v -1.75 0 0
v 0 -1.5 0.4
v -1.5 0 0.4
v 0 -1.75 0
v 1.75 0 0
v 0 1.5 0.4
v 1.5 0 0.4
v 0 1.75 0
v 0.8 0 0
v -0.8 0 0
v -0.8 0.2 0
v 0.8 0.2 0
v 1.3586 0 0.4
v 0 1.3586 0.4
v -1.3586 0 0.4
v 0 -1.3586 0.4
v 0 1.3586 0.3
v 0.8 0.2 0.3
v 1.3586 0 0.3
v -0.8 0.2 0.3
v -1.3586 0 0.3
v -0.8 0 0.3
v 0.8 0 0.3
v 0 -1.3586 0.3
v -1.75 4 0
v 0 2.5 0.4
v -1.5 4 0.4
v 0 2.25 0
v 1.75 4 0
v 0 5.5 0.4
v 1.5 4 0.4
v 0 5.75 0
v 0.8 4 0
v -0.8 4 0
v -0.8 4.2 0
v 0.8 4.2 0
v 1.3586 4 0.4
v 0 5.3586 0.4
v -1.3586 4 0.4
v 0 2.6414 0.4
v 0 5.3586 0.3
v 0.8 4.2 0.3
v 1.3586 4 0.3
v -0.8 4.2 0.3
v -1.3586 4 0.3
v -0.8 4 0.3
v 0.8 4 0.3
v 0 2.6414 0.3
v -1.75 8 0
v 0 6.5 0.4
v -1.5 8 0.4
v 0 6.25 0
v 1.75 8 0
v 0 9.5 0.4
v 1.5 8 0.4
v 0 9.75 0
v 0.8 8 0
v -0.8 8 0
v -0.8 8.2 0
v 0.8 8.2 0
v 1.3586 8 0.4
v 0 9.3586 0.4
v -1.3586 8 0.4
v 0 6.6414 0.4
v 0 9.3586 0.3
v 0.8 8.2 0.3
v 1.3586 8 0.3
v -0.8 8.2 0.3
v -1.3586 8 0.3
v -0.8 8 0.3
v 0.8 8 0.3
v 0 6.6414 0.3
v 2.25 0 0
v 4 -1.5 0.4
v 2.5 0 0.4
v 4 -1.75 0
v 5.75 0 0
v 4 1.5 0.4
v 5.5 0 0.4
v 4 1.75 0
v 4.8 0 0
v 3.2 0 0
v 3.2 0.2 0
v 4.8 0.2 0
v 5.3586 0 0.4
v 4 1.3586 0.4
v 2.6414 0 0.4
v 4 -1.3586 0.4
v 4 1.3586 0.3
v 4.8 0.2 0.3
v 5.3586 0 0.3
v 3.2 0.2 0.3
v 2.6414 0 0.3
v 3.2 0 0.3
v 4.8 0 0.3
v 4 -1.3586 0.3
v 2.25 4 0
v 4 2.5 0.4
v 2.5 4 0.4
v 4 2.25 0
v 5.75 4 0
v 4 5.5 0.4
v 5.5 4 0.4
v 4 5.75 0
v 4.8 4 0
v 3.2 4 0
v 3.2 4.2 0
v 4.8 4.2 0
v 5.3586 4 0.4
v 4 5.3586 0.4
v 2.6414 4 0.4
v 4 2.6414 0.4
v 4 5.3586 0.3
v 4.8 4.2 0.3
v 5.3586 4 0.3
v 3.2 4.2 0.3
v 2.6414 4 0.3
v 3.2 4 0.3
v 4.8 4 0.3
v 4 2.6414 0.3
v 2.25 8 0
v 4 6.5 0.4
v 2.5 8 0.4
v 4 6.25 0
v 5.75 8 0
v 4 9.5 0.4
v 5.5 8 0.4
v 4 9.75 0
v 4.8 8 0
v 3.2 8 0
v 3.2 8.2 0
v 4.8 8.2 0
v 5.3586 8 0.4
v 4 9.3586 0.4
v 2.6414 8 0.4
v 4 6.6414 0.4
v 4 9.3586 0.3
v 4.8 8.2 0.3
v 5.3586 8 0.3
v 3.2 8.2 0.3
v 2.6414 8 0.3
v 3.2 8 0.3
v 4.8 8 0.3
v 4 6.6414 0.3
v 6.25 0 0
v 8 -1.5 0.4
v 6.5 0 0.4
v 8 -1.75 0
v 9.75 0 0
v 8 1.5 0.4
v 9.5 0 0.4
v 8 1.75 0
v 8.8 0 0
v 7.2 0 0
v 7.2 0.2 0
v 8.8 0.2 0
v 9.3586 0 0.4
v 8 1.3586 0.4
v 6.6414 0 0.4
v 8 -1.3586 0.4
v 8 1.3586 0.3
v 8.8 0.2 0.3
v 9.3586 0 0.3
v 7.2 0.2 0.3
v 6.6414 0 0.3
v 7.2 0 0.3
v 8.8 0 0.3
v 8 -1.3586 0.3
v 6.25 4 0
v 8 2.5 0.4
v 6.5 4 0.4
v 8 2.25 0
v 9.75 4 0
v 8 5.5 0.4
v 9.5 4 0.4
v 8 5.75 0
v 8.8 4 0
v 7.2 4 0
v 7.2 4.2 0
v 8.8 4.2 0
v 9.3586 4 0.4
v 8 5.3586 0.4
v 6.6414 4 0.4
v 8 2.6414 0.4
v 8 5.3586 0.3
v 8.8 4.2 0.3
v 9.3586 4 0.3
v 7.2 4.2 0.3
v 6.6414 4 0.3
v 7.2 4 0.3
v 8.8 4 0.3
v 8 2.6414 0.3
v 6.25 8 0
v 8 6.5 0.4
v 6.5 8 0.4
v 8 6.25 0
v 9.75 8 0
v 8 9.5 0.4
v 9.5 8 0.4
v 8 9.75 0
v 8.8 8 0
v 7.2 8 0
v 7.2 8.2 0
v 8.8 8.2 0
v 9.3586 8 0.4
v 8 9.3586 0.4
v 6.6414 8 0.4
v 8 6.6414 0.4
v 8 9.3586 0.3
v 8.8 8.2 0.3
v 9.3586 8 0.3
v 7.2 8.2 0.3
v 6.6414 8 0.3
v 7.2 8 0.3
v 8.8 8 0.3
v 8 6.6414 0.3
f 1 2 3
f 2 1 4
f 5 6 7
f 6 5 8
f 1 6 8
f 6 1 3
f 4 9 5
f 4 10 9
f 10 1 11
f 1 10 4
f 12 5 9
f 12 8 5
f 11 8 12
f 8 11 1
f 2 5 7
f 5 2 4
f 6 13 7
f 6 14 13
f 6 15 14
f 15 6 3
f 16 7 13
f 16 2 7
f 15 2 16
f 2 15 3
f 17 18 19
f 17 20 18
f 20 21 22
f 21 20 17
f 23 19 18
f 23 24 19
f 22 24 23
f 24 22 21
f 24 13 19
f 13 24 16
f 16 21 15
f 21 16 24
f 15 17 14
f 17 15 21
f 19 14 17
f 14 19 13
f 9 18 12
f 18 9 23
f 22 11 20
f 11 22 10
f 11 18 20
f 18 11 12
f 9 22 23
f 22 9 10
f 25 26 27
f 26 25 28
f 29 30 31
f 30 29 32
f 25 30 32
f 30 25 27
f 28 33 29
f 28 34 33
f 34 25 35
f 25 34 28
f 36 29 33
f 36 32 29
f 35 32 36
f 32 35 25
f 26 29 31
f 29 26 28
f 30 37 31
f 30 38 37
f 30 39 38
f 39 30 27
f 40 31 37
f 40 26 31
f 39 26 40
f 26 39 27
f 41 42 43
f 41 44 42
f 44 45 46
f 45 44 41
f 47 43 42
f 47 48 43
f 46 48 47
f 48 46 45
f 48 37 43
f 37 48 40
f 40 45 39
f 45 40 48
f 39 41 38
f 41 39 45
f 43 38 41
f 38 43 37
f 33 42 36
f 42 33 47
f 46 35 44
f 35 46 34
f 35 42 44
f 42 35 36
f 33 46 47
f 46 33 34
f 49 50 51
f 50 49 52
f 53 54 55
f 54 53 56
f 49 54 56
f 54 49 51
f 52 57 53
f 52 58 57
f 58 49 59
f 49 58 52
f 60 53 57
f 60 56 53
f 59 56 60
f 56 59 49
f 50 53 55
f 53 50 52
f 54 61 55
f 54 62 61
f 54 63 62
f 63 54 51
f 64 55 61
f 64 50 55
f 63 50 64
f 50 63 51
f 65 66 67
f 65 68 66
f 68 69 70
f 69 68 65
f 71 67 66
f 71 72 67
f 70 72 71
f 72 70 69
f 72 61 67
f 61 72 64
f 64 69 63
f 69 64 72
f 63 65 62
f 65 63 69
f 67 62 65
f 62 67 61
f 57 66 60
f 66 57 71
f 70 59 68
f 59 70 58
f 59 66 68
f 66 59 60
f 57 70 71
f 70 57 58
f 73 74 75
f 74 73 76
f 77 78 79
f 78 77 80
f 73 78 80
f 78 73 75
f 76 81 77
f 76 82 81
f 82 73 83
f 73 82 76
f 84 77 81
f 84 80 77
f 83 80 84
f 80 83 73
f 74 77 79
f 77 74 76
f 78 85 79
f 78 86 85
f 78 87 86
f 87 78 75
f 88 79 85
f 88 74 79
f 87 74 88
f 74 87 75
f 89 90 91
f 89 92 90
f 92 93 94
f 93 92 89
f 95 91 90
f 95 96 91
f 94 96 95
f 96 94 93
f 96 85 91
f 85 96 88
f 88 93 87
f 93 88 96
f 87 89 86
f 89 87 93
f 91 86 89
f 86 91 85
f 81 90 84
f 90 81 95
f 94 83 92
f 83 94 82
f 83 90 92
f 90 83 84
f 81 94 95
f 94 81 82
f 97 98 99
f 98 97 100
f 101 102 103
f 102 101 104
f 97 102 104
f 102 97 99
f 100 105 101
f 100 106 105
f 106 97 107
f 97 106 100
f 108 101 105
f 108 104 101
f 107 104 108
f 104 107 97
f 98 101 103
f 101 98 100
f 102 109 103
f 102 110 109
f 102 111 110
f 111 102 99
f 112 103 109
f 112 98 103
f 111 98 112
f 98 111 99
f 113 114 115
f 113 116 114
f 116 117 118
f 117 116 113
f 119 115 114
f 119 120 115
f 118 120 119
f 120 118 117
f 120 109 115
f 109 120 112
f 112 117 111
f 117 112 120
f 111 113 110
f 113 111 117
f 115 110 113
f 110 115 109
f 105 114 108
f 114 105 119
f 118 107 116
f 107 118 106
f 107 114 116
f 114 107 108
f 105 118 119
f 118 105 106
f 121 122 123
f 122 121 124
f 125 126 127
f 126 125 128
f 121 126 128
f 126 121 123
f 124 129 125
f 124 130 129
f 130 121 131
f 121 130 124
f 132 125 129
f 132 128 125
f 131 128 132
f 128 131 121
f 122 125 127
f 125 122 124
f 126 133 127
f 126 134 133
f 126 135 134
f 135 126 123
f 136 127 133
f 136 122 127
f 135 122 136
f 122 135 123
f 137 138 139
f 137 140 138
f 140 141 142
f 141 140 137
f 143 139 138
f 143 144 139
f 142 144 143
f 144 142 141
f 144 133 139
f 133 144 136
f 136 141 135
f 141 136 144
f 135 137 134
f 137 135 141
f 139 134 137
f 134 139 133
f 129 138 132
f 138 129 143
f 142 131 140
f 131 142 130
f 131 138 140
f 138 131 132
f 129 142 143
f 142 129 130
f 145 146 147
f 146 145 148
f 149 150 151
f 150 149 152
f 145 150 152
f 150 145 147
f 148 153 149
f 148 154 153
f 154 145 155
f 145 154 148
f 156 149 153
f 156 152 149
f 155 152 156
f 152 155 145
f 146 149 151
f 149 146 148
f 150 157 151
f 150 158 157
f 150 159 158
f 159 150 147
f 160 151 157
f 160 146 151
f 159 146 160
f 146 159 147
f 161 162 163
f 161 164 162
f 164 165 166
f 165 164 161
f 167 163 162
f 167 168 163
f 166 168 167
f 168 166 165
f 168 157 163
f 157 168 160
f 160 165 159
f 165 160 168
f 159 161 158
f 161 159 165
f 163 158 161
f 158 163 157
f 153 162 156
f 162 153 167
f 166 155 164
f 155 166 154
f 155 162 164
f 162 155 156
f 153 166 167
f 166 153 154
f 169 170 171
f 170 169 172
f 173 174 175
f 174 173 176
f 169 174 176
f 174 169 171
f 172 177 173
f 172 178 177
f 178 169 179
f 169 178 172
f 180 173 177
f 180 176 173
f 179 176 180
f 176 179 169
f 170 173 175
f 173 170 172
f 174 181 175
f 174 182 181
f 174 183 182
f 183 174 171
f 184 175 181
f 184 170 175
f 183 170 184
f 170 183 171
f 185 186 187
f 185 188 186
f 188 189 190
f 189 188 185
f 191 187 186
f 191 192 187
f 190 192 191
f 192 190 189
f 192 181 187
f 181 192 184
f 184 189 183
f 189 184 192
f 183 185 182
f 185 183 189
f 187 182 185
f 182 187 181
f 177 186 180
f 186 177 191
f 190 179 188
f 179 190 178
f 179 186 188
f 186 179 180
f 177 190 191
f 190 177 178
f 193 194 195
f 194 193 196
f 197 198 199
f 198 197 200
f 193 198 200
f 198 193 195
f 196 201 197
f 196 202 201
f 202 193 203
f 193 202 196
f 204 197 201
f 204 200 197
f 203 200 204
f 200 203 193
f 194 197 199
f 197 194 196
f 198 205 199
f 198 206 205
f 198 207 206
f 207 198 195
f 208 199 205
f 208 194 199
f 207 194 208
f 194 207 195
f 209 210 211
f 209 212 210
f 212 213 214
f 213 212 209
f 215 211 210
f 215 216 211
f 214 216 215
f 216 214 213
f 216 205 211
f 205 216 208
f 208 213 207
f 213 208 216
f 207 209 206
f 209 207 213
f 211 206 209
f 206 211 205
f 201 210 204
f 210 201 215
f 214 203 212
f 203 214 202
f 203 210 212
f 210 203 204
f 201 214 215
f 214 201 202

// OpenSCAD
/*[global]*/
/*[base_diamensions]*/
//note: for square of 2cm, the diagonal is 2.83
top_diagonal_length = 3; 
bottom_diagonal_length = 3.5; 
height = 0.4; 
//sides of base. circle if sides <3 (or set to a BIG number)
sides =4; 

/* [center_slot] */
show_center_slot = 1;//[0:false,1:true]
//long end of the slot 
center_slot_length = 1.6;
//thickness of the slot
center_slot_breadth = 0.2;
//shift slot away from center
center_slot_y_offset = 0.1;
//rotate slot
center_slot_angle = 0;

/* [center_indentation]*/
show_center_indentation=1; //[0:false,1:true]
indentation_depth = 0.1;
indentation_offset_from_sides = 0.1; 

/*[multiple_quantities=*/
quantity_x = 3;
quantity_y = 3;
spacing_between_bases = 0.5;
 
for(i=[0: quantity_x-1]){
    
    for(j=[0: quantity_y-1]){ 
        offset_x = (bottom_diagonal_length+spacing_between_bases)*i;
        offset_y = (bottom_diagonal_length+spacing_between_bases)*j;
         
        translate([offset_x,offset_y,0])
        if(show_center_slot || show_center_indentation){
            difference(){
                base();
                indentation();
                center_slot();
            }
        }else{
            base();
        }
    }
}
 
module center_slot(){
    if(show_center_slot){ 
        rotate([0,0,center_slot_angle])
        translate([0,center_slot_y_offset, height/2])
        cube([center_slot_length, center_slot_breadth, height],center=true);
    }
}


module indentation(){
    
    if( show_center_indentation){
        translate([0,0,height-indentation_depth])
        linear_extrude(indentation_depth)
        offset(-indentation_offset_from_sides)
        if(sides<3){ 
            circle(  d =top_diagonal_length, $fn = 80 ); 
        }else{
            circle( d =top_diagonal_length, $fn=sides);
        } 
    }
}

module base(){ 
     
    if(sides<3){ 
        cylinder(d1=bottom_diagonal_length, d2=top_diagonal_length, h=height, $fn = 80 ); 
    }else{
        cylinder(d1=bottom_diagonal_length, d2=top_diagonal_length, h=height, $fn=sides);
    } 

}
